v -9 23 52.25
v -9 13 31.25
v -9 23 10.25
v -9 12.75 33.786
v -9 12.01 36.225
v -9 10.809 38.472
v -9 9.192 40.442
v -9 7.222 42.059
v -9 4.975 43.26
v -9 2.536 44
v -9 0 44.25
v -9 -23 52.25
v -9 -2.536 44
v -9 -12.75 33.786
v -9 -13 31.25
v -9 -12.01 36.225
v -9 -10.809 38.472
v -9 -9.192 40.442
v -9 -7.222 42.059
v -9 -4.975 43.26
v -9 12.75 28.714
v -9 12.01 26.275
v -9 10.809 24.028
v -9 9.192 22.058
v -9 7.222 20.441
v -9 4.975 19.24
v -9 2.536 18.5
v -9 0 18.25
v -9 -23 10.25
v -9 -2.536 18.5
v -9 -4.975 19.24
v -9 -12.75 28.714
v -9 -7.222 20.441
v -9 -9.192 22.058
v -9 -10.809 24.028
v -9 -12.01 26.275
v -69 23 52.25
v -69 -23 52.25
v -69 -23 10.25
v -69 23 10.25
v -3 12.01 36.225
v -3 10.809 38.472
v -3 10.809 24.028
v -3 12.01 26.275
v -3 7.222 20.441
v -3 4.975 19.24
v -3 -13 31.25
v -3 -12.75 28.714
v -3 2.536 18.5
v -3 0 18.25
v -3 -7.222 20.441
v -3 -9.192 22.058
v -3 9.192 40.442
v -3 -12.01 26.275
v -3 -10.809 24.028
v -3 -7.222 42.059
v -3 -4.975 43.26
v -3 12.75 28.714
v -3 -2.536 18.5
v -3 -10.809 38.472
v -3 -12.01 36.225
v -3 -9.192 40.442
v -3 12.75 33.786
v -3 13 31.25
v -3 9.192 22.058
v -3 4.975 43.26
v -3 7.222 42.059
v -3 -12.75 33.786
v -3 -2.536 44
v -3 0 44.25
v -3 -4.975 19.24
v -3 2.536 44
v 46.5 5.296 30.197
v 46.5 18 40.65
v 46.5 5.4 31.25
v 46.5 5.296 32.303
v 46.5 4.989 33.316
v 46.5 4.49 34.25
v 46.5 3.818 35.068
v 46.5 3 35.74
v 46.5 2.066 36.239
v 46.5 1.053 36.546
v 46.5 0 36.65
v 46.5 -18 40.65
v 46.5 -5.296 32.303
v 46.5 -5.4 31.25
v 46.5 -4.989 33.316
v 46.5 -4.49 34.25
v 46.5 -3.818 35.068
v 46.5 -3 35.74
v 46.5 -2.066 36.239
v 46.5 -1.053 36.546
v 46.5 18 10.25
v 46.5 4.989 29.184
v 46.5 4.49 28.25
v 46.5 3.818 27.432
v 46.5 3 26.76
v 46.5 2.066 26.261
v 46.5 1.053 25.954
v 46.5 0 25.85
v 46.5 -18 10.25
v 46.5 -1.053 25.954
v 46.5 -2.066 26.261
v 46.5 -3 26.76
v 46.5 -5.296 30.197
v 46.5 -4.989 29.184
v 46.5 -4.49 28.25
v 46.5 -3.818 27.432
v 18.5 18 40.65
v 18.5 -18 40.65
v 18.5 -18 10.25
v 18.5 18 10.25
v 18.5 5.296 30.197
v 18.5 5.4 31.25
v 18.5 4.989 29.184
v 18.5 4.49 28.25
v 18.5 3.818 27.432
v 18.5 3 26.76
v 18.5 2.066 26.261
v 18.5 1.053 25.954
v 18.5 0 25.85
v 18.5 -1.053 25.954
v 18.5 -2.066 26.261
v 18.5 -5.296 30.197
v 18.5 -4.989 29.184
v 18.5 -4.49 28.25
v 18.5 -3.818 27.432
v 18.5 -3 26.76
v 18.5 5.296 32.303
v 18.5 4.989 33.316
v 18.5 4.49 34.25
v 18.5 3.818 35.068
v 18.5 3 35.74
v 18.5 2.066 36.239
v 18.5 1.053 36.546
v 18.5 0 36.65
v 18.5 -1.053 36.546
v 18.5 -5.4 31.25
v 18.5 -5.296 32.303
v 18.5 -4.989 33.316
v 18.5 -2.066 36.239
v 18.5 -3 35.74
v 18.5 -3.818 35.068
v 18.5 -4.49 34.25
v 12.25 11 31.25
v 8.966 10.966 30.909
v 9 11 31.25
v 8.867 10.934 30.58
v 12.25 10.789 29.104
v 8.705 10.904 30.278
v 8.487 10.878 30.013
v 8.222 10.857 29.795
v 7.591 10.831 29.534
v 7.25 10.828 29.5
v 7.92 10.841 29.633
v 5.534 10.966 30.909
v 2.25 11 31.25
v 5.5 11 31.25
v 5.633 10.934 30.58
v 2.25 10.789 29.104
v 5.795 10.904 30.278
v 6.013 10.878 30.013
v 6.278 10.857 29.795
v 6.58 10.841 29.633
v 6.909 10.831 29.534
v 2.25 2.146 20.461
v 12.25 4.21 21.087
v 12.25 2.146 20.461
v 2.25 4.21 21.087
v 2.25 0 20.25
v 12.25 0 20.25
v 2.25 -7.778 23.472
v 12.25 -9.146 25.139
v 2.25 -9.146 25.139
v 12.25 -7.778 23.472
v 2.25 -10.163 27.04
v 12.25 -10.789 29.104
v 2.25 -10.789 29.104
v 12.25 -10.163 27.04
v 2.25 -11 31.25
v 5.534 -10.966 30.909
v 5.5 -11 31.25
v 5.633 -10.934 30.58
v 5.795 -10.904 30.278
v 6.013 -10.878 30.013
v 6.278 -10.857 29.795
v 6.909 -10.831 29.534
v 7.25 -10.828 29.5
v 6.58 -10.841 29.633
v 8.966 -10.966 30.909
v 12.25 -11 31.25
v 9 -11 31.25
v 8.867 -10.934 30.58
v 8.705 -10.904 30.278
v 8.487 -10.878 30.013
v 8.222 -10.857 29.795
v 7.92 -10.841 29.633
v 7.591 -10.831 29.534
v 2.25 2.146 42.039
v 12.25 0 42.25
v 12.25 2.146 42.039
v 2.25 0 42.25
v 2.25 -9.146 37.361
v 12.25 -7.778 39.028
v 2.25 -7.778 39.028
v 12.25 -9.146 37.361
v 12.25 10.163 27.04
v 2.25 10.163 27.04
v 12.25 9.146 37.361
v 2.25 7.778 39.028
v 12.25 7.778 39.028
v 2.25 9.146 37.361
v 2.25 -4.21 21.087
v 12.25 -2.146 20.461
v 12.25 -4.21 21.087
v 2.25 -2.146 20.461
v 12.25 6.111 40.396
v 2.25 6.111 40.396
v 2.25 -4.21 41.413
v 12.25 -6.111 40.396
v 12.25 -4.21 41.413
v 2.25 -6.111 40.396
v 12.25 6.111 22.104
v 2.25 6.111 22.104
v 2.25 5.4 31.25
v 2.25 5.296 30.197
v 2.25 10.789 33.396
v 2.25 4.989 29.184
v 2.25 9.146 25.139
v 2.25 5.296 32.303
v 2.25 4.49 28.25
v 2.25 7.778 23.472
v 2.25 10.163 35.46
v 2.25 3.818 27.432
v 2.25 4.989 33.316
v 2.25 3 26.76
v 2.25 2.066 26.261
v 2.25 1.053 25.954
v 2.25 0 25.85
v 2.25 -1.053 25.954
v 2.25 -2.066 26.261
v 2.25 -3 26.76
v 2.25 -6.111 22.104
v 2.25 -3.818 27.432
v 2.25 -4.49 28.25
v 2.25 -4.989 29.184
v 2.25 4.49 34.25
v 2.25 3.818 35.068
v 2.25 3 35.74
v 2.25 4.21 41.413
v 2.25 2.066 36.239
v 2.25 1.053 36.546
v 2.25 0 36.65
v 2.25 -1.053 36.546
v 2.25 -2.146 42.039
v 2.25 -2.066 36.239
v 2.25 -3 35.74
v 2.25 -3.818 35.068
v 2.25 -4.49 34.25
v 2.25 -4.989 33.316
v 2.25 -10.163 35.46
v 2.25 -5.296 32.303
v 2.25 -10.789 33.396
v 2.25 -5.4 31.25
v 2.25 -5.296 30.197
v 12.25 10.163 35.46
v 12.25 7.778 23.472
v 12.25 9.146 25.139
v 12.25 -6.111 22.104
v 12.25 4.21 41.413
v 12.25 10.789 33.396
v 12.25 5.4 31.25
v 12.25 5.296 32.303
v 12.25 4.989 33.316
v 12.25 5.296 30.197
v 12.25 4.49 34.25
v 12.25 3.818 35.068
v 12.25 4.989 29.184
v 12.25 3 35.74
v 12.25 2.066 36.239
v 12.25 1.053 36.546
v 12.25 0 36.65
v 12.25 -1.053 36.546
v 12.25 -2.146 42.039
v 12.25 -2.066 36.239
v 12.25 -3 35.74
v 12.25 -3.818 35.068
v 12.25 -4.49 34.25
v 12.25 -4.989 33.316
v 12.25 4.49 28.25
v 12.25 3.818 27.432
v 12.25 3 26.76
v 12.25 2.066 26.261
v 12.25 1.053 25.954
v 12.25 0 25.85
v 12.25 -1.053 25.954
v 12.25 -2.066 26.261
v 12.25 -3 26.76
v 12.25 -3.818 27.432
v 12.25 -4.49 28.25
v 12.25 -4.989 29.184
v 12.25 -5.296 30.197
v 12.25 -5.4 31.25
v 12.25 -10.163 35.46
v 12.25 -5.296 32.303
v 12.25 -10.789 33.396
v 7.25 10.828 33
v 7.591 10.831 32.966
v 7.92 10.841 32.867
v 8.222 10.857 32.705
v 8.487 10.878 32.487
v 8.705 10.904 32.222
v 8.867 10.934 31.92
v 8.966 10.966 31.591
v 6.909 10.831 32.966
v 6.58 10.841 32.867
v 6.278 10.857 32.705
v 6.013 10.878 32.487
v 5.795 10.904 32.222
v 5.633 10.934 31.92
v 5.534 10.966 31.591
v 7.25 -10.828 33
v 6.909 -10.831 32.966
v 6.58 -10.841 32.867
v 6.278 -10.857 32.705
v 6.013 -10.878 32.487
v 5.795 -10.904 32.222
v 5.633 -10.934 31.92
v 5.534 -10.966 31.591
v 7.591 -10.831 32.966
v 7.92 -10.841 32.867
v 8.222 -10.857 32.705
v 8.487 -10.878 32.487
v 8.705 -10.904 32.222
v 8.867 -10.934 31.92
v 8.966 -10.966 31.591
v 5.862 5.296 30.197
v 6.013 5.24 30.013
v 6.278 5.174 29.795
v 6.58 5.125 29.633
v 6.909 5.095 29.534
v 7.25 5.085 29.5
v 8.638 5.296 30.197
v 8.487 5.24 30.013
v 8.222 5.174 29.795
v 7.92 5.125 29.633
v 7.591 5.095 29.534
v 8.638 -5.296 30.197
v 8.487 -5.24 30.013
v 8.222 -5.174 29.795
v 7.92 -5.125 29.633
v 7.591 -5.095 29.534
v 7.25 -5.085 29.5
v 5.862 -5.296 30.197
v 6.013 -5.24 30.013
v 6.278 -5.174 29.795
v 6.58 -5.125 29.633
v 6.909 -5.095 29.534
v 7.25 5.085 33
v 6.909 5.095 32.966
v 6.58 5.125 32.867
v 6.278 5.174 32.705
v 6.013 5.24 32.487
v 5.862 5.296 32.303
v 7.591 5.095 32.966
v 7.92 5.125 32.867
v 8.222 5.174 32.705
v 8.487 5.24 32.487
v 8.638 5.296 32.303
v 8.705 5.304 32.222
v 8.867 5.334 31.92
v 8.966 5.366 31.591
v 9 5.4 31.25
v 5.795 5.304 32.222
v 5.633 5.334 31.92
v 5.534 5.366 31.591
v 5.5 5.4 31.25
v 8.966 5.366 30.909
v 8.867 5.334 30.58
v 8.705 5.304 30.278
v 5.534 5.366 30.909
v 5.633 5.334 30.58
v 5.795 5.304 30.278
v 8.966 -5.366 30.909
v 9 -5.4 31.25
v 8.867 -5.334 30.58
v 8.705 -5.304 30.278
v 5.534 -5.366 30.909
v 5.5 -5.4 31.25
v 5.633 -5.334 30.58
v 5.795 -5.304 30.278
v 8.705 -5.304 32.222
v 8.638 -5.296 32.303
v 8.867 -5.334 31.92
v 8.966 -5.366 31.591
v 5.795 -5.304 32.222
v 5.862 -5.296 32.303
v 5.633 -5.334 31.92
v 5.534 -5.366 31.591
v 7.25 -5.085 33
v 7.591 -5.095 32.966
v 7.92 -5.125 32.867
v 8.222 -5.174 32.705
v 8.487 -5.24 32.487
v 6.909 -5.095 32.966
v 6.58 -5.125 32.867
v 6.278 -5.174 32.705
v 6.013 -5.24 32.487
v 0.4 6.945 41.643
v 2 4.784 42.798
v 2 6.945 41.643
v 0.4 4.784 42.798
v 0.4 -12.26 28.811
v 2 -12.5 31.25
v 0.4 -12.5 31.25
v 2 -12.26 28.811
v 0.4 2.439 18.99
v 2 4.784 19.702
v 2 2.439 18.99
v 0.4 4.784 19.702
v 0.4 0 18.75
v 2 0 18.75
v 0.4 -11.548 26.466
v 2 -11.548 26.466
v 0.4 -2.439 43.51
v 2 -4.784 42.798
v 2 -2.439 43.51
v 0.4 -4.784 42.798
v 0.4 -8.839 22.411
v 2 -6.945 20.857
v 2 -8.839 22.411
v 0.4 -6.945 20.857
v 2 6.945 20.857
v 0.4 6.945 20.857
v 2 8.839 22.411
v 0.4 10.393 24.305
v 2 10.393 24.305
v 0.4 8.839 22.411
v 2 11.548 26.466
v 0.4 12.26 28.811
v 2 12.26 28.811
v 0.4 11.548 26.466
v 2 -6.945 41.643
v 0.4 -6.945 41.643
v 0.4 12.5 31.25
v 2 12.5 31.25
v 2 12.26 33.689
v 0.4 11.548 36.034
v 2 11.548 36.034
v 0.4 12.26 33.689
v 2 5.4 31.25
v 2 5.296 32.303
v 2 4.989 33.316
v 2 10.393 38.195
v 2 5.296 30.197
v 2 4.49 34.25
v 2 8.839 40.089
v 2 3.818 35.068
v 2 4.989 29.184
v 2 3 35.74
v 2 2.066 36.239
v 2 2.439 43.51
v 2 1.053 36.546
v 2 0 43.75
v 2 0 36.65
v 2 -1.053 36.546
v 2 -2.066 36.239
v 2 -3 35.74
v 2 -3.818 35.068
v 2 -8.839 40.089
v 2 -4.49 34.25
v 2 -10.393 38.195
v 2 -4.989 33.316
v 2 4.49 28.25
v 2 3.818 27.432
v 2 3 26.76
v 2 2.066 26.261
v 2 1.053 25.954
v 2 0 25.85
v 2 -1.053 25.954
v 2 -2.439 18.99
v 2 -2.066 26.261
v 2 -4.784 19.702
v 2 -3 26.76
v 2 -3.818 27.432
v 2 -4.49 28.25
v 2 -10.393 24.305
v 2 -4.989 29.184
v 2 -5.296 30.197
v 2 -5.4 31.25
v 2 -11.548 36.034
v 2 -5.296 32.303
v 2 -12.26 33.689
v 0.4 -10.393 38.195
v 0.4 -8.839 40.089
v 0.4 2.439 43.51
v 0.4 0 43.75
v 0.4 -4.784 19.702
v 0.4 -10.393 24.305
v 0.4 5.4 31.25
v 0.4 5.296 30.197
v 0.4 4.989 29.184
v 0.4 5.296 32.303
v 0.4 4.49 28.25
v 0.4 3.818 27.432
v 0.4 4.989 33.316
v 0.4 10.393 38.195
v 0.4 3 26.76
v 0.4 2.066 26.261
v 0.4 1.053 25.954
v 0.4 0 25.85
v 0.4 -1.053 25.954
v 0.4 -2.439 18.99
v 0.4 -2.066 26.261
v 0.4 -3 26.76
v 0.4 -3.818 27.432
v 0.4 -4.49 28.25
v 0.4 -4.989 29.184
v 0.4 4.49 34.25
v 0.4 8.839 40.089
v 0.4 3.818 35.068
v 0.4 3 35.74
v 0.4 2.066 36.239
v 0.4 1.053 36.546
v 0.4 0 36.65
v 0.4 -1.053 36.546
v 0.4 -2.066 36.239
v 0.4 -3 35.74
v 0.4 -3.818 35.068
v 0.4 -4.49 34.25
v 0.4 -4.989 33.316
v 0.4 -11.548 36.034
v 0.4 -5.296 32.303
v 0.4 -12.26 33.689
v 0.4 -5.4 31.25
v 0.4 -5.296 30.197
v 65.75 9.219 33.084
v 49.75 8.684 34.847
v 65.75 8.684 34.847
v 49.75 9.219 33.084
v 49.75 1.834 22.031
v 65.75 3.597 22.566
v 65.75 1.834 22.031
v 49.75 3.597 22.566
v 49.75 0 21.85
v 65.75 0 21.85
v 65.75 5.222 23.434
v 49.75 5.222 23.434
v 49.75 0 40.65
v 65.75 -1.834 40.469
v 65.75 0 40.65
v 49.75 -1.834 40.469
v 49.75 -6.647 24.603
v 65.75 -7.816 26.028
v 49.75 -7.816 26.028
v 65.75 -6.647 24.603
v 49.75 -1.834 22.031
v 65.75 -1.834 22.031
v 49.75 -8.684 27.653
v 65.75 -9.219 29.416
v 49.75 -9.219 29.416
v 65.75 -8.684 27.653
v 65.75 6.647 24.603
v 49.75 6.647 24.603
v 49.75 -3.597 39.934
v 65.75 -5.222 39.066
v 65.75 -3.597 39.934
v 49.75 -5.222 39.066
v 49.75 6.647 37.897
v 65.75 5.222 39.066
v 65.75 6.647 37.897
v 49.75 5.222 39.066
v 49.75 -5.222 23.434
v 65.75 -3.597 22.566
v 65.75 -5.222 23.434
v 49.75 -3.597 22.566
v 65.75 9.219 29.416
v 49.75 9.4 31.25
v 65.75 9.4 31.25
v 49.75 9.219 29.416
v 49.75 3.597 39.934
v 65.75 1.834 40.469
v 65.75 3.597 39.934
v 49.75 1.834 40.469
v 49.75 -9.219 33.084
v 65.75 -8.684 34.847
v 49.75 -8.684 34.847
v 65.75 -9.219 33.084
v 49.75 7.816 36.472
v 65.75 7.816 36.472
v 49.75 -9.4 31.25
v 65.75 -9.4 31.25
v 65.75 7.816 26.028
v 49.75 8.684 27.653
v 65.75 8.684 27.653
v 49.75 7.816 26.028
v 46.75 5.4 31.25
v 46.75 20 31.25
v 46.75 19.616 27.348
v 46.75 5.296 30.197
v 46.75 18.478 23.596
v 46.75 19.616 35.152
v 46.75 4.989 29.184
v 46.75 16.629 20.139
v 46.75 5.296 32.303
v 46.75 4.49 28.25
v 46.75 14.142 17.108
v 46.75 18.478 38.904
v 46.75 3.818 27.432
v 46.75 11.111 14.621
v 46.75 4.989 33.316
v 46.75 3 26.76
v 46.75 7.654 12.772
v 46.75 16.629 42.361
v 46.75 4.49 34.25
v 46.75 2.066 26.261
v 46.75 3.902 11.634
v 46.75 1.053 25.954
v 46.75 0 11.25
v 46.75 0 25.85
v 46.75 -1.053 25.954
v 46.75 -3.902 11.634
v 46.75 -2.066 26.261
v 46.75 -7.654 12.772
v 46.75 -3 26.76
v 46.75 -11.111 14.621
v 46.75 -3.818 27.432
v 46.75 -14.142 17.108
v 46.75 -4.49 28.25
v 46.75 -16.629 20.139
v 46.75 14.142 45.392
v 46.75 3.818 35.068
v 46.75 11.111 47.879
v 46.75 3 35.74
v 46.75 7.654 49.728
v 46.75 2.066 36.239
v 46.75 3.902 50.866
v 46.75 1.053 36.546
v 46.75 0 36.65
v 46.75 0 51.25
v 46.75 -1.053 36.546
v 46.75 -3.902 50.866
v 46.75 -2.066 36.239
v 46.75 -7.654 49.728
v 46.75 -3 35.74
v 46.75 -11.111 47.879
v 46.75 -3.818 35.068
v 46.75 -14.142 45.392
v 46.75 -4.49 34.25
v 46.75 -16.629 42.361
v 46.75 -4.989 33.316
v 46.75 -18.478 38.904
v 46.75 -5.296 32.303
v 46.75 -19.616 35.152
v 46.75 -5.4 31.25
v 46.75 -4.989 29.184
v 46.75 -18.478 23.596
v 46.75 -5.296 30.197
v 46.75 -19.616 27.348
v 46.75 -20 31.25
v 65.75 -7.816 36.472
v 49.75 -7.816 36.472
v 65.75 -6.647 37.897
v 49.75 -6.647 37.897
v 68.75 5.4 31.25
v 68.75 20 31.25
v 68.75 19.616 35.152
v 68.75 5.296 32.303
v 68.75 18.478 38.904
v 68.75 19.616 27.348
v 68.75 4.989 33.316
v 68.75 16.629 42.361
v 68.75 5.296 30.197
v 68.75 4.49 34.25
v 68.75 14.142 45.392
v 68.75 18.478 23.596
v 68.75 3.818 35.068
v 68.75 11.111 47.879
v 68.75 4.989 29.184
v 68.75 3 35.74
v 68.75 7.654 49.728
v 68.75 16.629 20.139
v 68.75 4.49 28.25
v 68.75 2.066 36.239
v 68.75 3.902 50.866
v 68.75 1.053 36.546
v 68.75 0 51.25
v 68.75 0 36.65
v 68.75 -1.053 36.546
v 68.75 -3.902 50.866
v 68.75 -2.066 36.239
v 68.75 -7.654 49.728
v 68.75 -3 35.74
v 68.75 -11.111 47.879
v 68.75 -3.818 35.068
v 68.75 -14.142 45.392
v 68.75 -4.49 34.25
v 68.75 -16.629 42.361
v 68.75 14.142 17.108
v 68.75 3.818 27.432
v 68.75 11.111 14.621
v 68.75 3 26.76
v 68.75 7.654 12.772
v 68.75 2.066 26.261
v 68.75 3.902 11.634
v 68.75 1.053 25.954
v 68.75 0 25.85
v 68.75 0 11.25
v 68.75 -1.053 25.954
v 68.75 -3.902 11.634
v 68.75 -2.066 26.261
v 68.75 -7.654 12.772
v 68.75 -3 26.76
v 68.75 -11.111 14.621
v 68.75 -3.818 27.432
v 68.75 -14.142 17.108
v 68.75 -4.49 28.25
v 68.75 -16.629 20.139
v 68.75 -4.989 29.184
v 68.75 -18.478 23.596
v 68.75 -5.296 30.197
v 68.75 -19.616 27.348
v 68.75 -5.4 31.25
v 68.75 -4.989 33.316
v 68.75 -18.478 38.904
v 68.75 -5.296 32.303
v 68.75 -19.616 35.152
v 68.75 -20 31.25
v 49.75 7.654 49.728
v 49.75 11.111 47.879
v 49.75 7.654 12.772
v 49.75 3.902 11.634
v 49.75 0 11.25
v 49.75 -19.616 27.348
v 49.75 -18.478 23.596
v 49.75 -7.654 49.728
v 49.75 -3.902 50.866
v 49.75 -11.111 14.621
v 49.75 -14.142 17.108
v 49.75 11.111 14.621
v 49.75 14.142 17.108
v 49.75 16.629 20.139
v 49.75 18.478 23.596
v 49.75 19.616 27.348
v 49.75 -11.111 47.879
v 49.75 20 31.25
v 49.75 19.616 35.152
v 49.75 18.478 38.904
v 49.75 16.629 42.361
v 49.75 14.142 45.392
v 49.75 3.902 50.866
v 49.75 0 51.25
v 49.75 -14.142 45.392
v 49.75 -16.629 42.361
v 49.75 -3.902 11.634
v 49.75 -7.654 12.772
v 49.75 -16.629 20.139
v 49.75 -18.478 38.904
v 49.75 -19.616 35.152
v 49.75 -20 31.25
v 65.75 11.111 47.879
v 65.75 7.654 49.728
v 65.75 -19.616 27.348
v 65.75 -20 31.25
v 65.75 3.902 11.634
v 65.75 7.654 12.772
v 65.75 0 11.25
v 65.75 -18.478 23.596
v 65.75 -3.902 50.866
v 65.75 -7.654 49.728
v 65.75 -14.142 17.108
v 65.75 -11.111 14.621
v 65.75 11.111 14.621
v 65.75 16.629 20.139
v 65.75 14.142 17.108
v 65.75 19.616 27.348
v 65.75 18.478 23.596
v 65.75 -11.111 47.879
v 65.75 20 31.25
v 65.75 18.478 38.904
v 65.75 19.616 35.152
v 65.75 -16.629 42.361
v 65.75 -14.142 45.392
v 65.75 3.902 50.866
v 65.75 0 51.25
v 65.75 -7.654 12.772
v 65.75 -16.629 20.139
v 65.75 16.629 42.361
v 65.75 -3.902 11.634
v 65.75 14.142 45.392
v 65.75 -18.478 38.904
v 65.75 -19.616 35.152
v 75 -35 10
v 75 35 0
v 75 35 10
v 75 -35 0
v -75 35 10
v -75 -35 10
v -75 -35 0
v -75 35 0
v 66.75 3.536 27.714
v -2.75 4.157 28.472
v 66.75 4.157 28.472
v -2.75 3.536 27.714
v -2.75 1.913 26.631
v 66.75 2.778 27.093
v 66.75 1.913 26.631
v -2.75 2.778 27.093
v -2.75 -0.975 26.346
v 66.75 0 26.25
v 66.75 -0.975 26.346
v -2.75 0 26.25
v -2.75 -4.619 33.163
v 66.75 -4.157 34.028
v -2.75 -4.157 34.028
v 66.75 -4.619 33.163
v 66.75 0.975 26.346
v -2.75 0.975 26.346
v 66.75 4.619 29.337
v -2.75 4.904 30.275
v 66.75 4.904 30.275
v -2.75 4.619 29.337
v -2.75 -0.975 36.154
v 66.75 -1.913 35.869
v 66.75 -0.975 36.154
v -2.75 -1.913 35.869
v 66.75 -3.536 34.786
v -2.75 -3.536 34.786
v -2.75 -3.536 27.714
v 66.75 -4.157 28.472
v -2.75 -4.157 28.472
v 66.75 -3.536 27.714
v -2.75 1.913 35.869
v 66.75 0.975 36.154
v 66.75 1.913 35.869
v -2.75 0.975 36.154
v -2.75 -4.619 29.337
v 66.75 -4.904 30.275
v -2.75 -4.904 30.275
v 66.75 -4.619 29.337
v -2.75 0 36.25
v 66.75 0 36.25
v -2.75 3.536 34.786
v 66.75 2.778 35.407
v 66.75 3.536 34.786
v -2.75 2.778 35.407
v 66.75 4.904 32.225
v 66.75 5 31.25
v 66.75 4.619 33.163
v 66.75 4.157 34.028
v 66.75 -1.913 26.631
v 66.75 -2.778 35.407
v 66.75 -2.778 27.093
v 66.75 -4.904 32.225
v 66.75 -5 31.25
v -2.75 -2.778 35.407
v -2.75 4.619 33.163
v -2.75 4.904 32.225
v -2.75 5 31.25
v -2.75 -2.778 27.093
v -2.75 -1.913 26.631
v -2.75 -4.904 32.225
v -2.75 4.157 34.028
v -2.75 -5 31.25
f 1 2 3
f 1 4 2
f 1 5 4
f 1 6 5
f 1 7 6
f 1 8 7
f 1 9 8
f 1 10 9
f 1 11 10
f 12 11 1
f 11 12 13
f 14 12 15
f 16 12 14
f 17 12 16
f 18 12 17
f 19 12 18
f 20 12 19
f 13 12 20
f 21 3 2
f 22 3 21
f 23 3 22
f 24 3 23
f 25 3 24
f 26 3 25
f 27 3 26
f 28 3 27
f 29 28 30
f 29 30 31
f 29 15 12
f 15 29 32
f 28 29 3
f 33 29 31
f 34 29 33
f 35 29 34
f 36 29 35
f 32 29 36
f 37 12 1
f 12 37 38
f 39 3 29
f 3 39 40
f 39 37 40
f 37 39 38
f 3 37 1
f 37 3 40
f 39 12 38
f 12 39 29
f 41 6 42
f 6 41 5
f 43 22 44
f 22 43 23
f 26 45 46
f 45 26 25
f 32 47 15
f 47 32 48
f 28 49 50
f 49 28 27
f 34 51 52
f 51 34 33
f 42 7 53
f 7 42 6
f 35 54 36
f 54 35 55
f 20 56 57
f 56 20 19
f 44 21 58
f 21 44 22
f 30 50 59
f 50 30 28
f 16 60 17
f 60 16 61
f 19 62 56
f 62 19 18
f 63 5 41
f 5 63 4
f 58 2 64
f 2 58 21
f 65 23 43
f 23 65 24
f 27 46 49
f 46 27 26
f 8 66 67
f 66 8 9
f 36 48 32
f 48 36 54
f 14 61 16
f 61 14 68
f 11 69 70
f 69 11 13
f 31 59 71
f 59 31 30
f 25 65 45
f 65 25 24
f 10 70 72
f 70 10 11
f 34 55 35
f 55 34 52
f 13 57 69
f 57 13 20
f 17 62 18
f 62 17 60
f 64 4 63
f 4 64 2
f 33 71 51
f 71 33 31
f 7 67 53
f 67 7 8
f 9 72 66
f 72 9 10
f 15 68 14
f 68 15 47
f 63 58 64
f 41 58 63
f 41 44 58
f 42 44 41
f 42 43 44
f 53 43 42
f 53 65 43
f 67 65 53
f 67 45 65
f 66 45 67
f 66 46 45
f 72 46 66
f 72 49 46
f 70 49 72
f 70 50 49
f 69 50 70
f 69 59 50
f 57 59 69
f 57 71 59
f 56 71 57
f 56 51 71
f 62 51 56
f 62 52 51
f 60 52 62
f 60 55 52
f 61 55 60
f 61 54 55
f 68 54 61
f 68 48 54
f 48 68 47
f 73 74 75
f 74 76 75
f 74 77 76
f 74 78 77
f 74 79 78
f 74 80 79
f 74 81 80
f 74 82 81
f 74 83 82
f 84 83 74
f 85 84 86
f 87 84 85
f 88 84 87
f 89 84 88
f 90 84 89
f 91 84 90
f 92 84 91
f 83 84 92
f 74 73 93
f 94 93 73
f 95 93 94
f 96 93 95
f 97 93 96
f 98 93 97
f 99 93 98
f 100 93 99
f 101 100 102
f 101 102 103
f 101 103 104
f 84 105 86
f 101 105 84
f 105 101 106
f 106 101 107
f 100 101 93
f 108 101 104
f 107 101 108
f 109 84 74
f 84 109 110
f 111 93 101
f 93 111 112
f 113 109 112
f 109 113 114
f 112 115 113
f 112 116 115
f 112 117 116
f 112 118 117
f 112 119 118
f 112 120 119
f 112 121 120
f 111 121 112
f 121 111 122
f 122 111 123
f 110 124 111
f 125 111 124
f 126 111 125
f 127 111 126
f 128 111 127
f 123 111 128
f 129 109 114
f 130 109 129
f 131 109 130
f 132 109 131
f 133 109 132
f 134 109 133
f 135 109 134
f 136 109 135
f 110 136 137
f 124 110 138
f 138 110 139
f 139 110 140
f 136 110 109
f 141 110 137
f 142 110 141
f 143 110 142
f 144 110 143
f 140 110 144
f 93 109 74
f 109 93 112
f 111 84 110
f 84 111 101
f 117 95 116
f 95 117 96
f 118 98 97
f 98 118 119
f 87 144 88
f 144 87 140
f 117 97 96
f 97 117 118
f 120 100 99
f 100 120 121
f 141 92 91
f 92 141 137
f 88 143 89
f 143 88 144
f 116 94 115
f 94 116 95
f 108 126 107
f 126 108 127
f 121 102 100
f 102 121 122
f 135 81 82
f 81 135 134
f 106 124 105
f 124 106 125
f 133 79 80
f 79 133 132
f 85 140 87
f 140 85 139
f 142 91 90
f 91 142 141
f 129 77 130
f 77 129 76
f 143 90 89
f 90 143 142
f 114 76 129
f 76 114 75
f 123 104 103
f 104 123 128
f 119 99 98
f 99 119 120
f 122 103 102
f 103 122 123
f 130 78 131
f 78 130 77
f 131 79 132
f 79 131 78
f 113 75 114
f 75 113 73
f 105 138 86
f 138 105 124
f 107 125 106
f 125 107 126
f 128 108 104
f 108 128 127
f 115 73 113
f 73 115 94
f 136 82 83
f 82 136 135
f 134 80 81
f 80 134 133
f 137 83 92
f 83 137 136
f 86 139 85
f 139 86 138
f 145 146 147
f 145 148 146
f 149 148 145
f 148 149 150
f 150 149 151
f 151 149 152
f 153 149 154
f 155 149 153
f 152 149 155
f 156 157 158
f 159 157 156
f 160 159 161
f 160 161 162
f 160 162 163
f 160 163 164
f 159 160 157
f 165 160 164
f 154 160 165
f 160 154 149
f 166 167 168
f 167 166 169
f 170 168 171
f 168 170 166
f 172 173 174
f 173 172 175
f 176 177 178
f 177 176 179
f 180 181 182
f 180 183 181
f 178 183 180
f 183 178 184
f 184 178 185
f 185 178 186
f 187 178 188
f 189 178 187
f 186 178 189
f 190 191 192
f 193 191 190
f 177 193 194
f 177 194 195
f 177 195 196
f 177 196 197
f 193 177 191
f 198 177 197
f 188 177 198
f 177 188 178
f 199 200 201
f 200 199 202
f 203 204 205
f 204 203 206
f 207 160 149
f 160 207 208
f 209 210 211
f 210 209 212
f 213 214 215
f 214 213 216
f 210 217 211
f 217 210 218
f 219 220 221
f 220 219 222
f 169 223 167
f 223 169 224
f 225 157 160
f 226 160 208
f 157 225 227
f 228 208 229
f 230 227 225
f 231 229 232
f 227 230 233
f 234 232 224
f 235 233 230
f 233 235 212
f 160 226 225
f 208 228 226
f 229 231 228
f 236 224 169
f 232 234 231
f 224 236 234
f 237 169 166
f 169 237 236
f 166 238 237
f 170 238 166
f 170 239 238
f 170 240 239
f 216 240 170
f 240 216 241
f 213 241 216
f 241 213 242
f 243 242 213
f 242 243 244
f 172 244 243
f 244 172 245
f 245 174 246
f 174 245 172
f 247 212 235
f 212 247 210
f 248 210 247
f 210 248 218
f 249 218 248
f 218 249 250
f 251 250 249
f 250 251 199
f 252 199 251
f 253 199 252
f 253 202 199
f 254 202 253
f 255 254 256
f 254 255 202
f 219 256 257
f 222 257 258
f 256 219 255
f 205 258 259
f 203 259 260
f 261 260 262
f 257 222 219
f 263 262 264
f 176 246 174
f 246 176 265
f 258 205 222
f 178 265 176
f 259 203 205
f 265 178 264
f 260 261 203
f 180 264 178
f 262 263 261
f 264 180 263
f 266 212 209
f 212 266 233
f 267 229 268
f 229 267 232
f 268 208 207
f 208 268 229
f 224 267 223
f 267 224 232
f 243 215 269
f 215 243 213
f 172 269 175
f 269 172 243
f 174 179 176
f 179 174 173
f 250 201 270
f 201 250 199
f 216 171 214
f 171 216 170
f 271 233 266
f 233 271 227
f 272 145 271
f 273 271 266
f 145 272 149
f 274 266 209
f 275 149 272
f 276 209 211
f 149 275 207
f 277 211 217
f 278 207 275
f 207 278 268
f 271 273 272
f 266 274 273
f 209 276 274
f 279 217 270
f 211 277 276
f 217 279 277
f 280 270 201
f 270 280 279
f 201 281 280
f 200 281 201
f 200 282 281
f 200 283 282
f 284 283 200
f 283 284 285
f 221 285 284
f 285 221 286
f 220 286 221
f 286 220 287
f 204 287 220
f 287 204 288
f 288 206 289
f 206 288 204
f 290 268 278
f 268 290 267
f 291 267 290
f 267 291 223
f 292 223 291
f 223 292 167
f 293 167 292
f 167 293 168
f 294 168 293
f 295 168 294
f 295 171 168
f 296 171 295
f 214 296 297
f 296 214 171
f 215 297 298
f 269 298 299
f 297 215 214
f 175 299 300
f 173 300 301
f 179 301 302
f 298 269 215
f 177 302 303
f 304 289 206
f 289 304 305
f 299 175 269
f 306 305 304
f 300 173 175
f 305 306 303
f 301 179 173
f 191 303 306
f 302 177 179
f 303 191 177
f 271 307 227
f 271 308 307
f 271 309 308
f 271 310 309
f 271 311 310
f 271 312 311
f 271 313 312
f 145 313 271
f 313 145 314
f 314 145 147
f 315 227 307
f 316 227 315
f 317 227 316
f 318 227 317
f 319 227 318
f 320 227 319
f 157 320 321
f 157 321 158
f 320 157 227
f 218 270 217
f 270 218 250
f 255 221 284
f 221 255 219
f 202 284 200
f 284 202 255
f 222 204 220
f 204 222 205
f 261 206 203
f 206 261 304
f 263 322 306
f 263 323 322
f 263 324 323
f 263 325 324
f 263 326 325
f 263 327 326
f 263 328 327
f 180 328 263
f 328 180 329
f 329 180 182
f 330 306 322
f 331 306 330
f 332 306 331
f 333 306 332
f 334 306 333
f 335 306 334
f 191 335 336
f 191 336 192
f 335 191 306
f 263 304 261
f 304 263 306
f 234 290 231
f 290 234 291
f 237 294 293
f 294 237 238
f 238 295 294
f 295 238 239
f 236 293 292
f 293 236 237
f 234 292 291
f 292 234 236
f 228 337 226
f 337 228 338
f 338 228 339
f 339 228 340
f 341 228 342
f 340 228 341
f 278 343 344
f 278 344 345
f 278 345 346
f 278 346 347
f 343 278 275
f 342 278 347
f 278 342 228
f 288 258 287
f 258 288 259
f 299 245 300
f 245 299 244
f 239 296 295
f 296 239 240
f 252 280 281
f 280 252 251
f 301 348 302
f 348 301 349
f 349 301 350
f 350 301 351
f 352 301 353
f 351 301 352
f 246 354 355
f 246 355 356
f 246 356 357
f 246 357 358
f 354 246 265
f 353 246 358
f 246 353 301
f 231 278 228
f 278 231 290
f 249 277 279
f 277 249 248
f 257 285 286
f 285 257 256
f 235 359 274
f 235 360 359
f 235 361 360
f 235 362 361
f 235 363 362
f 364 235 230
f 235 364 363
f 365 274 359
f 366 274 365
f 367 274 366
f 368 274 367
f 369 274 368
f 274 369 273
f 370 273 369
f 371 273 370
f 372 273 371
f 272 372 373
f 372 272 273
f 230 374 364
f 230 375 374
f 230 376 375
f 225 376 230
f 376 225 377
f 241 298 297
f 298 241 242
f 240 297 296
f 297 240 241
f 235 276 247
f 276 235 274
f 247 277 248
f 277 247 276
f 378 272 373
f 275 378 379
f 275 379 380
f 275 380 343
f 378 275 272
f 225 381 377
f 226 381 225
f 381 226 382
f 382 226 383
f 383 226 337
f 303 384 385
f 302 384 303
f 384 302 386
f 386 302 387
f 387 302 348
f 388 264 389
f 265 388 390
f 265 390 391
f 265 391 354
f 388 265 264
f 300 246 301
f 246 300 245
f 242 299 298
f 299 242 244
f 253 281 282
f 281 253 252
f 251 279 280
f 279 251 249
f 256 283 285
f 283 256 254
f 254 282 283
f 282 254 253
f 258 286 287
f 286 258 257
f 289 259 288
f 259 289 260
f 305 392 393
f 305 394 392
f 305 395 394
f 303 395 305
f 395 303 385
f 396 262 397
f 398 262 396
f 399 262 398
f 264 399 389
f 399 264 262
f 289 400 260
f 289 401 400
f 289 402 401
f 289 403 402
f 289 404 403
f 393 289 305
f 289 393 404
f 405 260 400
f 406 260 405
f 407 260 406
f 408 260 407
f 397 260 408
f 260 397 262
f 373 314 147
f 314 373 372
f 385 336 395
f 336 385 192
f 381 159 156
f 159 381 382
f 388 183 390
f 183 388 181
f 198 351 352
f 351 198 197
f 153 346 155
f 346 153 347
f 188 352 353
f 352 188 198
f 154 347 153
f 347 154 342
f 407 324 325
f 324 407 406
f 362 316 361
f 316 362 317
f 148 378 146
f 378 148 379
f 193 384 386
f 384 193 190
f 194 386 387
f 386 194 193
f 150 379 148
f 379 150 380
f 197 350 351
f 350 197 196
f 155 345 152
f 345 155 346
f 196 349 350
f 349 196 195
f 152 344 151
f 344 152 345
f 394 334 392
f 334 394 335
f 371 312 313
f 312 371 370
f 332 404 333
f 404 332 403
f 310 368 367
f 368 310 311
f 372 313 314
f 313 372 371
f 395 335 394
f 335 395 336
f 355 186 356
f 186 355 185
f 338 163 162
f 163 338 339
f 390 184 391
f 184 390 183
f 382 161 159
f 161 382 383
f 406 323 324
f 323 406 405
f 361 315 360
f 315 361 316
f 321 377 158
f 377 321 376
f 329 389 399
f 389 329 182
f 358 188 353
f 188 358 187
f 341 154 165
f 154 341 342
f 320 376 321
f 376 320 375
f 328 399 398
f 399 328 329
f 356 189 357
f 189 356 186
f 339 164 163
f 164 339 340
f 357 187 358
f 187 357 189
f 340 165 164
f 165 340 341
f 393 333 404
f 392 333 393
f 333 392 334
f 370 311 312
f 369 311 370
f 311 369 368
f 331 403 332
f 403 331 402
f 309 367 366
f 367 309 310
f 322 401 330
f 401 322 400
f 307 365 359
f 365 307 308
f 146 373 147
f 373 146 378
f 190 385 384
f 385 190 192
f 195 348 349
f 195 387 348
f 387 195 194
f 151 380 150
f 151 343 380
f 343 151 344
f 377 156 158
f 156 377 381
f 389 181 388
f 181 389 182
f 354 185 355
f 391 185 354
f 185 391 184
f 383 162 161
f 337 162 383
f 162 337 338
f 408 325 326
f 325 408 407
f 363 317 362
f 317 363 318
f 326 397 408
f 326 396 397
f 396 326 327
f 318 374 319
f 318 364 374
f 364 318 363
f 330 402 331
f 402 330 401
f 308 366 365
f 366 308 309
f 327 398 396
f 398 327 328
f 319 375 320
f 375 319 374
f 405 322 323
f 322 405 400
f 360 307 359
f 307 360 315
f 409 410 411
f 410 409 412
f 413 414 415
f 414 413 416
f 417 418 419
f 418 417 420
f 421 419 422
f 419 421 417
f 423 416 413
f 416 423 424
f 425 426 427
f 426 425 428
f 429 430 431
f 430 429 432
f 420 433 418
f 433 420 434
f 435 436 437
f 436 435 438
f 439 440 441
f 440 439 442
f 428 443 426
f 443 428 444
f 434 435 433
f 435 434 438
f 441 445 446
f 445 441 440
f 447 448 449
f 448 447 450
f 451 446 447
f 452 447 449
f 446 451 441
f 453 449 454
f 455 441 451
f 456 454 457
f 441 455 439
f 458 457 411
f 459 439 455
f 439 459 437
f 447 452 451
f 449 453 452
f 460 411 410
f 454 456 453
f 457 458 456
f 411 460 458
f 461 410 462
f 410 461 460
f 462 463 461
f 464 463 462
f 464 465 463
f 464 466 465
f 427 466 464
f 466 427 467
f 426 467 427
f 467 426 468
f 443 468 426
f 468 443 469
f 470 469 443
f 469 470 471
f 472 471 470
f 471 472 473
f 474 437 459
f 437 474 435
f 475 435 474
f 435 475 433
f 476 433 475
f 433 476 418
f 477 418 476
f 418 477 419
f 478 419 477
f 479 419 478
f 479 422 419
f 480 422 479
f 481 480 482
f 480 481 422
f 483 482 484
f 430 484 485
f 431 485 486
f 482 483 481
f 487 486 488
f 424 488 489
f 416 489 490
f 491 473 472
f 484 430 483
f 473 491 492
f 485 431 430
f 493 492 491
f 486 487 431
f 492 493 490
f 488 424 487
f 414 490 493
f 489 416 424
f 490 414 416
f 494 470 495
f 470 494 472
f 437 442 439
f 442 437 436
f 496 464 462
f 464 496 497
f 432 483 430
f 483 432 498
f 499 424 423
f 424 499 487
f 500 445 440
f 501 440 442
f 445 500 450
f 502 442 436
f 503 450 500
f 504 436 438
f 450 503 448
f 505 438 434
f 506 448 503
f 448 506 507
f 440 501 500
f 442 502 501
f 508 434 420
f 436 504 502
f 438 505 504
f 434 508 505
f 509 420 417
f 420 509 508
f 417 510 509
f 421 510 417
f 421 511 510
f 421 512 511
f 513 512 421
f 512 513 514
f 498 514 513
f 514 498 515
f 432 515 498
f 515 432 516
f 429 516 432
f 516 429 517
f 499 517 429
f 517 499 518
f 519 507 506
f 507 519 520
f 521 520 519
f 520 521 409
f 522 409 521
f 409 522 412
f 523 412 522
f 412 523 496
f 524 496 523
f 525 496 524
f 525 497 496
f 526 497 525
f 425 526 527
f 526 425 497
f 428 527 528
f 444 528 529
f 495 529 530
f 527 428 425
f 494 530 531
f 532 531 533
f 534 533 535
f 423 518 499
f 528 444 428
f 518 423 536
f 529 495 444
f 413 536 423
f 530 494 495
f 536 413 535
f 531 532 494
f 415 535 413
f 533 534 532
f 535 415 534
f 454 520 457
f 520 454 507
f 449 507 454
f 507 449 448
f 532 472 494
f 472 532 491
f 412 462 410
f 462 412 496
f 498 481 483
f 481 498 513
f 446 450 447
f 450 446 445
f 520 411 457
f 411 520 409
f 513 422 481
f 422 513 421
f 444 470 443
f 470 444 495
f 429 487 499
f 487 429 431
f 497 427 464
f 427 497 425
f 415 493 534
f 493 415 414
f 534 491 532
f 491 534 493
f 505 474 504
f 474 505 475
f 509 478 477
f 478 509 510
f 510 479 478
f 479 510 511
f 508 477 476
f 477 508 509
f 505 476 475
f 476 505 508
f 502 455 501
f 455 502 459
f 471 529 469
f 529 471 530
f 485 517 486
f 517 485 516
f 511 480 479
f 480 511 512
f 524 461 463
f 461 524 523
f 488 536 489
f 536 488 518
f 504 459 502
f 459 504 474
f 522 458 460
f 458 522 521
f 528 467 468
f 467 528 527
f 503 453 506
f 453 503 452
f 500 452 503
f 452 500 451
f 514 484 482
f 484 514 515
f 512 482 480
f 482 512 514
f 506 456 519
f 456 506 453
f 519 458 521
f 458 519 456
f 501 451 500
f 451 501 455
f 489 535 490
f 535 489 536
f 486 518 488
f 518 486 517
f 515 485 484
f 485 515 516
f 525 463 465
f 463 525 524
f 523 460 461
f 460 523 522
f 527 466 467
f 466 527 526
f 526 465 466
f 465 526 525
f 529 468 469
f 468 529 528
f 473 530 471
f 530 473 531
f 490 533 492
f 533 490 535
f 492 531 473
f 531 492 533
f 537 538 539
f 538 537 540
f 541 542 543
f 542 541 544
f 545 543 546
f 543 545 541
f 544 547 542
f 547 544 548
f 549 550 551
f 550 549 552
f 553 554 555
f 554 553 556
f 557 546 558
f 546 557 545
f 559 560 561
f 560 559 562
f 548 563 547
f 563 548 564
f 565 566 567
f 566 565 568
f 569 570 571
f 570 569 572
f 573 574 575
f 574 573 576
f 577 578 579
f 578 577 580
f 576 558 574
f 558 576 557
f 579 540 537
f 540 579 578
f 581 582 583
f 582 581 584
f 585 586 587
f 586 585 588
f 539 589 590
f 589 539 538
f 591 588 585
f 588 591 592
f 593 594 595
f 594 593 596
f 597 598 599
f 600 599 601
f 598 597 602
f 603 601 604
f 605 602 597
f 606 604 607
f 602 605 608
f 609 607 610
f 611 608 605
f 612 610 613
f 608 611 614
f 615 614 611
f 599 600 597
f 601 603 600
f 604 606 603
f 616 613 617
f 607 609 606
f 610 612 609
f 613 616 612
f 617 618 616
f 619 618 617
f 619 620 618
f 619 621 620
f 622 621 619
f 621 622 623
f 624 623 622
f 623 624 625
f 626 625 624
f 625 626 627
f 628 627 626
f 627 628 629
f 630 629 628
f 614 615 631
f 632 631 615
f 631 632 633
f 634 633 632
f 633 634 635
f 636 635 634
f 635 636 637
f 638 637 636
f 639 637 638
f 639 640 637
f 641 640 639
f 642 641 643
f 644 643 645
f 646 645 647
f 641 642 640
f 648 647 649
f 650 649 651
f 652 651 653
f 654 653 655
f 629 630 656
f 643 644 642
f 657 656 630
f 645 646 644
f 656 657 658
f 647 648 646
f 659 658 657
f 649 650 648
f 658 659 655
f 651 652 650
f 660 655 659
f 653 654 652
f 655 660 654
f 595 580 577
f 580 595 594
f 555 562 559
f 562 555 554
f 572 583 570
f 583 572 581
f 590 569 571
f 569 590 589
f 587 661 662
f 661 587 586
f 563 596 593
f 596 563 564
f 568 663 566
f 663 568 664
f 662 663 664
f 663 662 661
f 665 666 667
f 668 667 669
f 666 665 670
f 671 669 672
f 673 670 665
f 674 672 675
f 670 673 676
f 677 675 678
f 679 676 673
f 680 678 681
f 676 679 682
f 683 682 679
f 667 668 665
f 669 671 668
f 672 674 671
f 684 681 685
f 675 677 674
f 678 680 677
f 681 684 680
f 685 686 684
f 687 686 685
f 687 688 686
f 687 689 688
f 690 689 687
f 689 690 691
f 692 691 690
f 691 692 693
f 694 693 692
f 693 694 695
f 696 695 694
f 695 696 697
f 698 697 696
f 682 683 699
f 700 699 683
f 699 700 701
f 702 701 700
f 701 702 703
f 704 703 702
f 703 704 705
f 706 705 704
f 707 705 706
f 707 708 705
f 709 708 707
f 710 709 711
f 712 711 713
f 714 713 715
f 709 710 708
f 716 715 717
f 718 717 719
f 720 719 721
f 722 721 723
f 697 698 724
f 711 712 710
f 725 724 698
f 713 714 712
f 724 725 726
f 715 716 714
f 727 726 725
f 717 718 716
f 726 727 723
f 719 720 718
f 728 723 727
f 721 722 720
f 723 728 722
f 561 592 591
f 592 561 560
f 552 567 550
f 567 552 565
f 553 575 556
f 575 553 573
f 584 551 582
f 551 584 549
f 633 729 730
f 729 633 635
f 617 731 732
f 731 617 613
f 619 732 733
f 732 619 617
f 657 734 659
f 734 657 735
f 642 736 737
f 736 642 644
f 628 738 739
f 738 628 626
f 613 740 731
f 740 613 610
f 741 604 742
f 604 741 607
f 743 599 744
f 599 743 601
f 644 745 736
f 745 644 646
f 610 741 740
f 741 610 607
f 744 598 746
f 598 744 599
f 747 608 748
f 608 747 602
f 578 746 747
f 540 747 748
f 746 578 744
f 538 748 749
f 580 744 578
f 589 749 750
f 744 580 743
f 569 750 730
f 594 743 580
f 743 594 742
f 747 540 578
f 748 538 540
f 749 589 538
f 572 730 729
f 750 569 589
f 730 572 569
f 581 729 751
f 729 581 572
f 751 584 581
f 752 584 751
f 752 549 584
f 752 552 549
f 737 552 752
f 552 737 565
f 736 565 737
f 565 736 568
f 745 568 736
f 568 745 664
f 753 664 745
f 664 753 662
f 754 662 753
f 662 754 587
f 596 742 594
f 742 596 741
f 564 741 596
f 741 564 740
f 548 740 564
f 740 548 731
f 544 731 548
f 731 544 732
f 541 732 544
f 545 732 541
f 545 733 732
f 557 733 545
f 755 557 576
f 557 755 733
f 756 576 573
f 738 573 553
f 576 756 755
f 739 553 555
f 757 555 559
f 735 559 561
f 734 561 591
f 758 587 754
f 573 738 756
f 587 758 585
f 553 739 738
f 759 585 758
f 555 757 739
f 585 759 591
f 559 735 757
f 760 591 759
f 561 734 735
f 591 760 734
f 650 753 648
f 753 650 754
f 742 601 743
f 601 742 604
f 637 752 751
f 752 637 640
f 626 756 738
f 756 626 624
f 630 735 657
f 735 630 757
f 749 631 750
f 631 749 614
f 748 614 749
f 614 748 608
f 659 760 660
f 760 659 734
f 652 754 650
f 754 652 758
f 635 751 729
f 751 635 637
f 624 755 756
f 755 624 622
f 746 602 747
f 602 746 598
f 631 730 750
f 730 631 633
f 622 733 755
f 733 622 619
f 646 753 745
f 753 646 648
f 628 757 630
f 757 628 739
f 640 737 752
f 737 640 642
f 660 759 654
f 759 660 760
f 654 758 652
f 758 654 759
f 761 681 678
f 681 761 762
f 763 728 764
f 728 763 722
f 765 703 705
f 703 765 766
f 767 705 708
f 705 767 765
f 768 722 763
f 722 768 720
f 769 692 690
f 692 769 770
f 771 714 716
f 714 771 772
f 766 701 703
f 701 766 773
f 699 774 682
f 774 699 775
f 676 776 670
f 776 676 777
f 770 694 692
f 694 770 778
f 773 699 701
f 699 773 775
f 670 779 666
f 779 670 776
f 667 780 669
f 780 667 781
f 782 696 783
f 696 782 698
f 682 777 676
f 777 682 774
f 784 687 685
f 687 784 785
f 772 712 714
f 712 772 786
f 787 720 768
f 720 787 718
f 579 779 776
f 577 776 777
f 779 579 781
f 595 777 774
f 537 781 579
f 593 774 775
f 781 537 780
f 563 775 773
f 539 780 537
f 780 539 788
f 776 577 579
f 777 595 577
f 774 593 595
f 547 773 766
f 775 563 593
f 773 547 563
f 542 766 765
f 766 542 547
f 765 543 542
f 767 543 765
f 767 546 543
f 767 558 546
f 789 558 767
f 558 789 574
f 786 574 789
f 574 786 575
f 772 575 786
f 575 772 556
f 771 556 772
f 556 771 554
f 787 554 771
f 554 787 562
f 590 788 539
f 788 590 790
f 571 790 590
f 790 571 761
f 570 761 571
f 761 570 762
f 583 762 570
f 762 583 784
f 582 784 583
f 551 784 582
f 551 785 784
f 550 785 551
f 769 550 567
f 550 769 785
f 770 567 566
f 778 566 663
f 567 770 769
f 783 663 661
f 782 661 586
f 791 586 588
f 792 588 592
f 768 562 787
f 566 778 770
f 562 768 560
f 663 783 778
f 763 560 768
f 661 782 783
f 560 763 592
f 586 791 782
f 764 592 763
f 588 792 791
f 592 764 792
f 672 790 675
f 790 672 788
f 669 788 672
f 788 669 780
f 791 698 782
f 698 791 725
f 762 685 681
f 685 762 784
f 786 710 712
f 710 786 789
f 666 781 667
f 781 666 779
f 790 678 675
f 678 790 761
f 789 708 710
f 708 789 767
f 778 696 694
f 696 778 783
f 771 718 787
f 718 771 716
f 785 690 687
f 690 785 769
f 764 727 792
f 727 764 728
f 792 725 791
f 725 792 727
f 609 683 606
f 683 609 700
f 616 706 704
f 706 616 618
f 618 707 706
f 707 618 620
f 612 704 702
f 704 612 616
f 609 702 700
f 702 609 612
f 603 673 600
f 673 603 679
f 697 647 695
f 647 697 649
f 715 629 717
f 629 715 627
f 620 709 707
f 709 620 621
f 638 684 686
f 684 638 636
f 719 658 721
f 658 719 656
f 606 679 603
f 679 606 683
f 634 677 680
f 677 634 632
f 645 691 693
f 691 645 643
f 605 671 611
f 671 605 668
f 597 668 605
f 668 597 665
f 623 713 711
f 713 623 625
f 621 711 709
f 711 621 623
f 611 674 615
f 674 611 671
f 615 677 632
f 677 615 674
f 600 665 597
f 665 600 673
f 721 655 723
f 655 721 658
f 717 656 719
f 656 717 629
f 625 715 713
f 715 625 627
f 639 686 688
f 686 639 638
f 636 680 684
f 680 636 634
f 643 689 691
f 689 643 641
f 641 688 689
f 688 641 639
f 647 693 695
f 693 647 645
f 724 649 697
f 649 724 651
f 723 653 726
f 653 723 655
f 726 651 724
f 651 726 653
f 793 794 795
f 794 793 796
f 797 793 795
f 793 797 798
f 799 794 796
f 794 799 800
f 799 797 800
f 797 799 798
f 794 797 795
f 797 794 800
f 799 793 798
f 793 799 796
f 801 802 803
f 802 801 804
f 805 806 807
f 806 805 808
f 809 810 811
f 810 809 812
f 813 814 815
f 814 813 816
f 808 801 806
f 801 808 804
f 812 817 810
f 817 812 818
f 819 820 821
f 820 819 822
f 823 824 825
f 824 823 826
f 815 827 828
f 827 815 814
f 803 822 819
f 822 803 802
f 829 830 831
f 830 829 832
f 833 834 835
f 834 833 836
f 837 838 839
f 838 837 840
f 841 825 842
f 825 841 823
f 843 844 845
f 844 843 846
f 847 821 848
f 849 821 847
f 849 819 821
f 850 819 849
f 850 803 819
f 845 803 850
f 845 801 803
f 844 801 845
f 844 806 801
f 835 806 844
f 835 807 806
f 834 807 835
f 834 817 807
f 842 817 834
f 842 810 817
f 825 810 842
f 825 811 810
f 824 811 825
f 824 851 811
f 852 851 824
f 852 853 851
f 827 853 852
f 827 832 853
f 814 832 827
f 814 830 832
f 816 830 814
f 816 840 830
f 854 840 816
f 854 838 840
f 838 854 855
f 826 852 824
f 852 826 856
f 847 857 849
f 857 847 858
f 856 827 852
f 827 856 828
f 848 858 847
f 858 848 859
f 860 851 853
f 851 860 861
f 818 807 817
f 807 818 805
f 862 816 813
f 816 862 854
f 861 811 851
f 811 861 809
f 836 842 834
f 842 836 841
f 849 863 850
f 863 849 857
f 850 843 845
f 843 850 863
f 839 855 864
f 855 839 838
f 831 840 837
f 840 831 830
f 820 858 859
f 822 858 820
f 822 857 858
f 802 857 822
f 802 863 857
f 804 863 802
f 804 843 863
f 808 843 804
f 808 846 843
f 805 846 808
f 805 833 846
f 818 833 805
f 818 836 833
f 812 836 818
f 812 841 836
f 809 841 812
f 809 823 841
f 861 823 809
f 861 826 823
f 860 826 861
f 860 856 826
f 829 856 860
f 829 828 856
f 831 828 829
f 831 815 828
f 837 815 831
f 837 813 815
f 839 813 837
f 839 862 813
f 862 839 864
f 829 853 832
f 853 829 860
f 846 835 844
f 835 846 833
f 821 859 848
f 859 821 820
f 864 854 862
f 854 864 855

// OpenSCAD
$fn = 32;

// ------------------------------------------------------------------------
// Motor drive station: motor 60 x 42 mm, shaft d10, pulley d40
// Every part is its own module, assembly() places every instance.
// ------------------------------------------------------------------------

// --- part 1 ---
module station_bed() {
  difference() {
    translate([-75, -35, 0]) cube([150, 70, 10]);
  }
}

// --- part 2 ---
module drive_motor() {
  union() {
    translate([-30, -23, 0]) cube([60, 46, 42]);
    translate([33, 0, 21]) rotate([0, 90, 0]) cylinder(h = 6, d = 26, center = true);
  }
}

// --- part 3 ---
module pillow_block() {
  difference() {
    translate([-14, -18, 0]) cube([28, 36, 30.4]);
    translate([0, 0, 21]) rotate([0, 90, 0]) cylinder(h = 30, d = 10.8, center = true);
  }
}

// --- part 4 ---
module drive_shaft() {
  translate([0, 0, -34.75]) cylinder(h = 69.5, d = 10);
}

// --- part 5 ---
module shaft_collar() {
  difference() {
    cylinder(h = 10, d = 22);
    translate([0, 0, -1]) cylinder(h = 12, d = 10.8);
    translate([0, 0, 5]) rotate([90, 0, 0]) cylinder(h = 24, d = 3.5, center = true);
  }
}

// --- part 6 ---
module collar_washer() {
  difference() {
      translate([0, 0, 0]) cylinder(h = 1.6, d = 25);
      translate([0, 0, -1]) cylinder(h = 3.6, d = 10.8);
    }
}

// --- part 7 ---
module drive_pulley() {
  difference() {
    union() {
      cylinder(h = 22, d = 18.8);
      cylinder(h = 3, d = 40);
      translate([0, 0, 19]) cylinder(h = 3, d = 40);
    }
    translate([0, 0, -1]) cylinder(h = 24, d = 10.8);
  }
}

// --- assembly ---
module assembly() {
  color([0.80, 0.24, 0.20]) translate([0, 0, 0]) rotate([0, 0, 0]) station_bed();
  color([0.20, 0.45, 0.75]) translate([-39, 0, 10.25]) rotate([0, 0, 0]) drive_motor();
  color([0.25, 0.62, 0.32]) translate([32.5, 0, 10.25]) rotate([0, 0, 0]) pillow_block();
  color([0.92, 0.70, 0.18]) translate([32, 0, 31.25]) rotate([0, 90, 0]) drive_shaft();
  color([0.58, 0.35, 0.70]) translate([2.25, 0, 31.25]) rotate([0, 90, 0]) shaft_collar();
  color([0.16, 0.66, 0.66]) translate([0.4, 0, 31.25]) rotate([0, 90, 0]) collar_washer();
  color([0.85, 0.48, 0.18]) translate([46.75, 0, 31.25]) rotate([0, 90, 0]) drive_pulley();
}

assembly();
